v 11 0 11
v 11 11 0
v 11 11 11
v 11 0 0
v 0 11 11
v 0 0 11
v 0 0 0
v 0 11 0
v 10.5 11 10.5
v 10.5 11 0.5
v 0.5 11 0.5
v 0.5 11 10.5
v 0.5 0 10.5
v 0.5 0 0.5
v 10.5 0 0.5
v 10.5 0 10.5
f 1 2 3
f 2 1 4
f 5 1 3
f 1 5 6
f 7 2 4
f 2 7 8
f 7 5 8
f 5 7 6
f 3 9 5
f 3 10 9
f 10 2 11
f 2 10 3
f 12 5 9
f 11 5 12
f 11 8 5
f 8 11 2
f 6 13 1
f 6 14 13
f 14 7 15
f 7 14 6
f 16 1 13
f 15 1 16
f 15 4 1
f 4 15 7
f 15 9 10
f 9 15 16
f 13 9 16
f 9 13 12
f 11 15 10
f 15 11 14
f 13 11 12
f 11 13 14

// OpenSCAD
module vectorBox(){
    //just a small demonstrator for vector subtraction and addition
    // as things can get complicated with single unit variables the below shows
 //how it can be abstracted and simplified
    //inside side length
    inSize = 10 ;
    //wall thickness
    wallThick = .5;
    //the vectors predefined
    inSizeA = [inSize,inSize,inSize] ;
    inSizeX = [inSize,0,0] ;
    inSizeY = [0,inSize,0] ;
    inSizeZ = [0,0,inSize] ;
    offset = wallThick * 2 ;
    offsetA = [offset,offset,offset] ;
    offsetX = [offset,0,0] ;
    offsetY = [0,offset,0] ;
    offsetZ = [0,0,offset] ;
    offsetZY = offsetZ + offsetY ;
    offsetZX = offsetZ + offsetX ;
    offsetXY = offsetX + offsetY ;
    diffWiggle = .1 ;
    diffWiggleY = [0,diffWiggle,0] ;
    difference() {
        //total volume cube
        cube(inSizeA + offsetA);
        //inside volume cube
        translate((offsetZX)/2 - diffWiggleY/2) 
            cube(inSizeA + offsetY + diffWiggleY);
    }
 }
 vectorBox();
